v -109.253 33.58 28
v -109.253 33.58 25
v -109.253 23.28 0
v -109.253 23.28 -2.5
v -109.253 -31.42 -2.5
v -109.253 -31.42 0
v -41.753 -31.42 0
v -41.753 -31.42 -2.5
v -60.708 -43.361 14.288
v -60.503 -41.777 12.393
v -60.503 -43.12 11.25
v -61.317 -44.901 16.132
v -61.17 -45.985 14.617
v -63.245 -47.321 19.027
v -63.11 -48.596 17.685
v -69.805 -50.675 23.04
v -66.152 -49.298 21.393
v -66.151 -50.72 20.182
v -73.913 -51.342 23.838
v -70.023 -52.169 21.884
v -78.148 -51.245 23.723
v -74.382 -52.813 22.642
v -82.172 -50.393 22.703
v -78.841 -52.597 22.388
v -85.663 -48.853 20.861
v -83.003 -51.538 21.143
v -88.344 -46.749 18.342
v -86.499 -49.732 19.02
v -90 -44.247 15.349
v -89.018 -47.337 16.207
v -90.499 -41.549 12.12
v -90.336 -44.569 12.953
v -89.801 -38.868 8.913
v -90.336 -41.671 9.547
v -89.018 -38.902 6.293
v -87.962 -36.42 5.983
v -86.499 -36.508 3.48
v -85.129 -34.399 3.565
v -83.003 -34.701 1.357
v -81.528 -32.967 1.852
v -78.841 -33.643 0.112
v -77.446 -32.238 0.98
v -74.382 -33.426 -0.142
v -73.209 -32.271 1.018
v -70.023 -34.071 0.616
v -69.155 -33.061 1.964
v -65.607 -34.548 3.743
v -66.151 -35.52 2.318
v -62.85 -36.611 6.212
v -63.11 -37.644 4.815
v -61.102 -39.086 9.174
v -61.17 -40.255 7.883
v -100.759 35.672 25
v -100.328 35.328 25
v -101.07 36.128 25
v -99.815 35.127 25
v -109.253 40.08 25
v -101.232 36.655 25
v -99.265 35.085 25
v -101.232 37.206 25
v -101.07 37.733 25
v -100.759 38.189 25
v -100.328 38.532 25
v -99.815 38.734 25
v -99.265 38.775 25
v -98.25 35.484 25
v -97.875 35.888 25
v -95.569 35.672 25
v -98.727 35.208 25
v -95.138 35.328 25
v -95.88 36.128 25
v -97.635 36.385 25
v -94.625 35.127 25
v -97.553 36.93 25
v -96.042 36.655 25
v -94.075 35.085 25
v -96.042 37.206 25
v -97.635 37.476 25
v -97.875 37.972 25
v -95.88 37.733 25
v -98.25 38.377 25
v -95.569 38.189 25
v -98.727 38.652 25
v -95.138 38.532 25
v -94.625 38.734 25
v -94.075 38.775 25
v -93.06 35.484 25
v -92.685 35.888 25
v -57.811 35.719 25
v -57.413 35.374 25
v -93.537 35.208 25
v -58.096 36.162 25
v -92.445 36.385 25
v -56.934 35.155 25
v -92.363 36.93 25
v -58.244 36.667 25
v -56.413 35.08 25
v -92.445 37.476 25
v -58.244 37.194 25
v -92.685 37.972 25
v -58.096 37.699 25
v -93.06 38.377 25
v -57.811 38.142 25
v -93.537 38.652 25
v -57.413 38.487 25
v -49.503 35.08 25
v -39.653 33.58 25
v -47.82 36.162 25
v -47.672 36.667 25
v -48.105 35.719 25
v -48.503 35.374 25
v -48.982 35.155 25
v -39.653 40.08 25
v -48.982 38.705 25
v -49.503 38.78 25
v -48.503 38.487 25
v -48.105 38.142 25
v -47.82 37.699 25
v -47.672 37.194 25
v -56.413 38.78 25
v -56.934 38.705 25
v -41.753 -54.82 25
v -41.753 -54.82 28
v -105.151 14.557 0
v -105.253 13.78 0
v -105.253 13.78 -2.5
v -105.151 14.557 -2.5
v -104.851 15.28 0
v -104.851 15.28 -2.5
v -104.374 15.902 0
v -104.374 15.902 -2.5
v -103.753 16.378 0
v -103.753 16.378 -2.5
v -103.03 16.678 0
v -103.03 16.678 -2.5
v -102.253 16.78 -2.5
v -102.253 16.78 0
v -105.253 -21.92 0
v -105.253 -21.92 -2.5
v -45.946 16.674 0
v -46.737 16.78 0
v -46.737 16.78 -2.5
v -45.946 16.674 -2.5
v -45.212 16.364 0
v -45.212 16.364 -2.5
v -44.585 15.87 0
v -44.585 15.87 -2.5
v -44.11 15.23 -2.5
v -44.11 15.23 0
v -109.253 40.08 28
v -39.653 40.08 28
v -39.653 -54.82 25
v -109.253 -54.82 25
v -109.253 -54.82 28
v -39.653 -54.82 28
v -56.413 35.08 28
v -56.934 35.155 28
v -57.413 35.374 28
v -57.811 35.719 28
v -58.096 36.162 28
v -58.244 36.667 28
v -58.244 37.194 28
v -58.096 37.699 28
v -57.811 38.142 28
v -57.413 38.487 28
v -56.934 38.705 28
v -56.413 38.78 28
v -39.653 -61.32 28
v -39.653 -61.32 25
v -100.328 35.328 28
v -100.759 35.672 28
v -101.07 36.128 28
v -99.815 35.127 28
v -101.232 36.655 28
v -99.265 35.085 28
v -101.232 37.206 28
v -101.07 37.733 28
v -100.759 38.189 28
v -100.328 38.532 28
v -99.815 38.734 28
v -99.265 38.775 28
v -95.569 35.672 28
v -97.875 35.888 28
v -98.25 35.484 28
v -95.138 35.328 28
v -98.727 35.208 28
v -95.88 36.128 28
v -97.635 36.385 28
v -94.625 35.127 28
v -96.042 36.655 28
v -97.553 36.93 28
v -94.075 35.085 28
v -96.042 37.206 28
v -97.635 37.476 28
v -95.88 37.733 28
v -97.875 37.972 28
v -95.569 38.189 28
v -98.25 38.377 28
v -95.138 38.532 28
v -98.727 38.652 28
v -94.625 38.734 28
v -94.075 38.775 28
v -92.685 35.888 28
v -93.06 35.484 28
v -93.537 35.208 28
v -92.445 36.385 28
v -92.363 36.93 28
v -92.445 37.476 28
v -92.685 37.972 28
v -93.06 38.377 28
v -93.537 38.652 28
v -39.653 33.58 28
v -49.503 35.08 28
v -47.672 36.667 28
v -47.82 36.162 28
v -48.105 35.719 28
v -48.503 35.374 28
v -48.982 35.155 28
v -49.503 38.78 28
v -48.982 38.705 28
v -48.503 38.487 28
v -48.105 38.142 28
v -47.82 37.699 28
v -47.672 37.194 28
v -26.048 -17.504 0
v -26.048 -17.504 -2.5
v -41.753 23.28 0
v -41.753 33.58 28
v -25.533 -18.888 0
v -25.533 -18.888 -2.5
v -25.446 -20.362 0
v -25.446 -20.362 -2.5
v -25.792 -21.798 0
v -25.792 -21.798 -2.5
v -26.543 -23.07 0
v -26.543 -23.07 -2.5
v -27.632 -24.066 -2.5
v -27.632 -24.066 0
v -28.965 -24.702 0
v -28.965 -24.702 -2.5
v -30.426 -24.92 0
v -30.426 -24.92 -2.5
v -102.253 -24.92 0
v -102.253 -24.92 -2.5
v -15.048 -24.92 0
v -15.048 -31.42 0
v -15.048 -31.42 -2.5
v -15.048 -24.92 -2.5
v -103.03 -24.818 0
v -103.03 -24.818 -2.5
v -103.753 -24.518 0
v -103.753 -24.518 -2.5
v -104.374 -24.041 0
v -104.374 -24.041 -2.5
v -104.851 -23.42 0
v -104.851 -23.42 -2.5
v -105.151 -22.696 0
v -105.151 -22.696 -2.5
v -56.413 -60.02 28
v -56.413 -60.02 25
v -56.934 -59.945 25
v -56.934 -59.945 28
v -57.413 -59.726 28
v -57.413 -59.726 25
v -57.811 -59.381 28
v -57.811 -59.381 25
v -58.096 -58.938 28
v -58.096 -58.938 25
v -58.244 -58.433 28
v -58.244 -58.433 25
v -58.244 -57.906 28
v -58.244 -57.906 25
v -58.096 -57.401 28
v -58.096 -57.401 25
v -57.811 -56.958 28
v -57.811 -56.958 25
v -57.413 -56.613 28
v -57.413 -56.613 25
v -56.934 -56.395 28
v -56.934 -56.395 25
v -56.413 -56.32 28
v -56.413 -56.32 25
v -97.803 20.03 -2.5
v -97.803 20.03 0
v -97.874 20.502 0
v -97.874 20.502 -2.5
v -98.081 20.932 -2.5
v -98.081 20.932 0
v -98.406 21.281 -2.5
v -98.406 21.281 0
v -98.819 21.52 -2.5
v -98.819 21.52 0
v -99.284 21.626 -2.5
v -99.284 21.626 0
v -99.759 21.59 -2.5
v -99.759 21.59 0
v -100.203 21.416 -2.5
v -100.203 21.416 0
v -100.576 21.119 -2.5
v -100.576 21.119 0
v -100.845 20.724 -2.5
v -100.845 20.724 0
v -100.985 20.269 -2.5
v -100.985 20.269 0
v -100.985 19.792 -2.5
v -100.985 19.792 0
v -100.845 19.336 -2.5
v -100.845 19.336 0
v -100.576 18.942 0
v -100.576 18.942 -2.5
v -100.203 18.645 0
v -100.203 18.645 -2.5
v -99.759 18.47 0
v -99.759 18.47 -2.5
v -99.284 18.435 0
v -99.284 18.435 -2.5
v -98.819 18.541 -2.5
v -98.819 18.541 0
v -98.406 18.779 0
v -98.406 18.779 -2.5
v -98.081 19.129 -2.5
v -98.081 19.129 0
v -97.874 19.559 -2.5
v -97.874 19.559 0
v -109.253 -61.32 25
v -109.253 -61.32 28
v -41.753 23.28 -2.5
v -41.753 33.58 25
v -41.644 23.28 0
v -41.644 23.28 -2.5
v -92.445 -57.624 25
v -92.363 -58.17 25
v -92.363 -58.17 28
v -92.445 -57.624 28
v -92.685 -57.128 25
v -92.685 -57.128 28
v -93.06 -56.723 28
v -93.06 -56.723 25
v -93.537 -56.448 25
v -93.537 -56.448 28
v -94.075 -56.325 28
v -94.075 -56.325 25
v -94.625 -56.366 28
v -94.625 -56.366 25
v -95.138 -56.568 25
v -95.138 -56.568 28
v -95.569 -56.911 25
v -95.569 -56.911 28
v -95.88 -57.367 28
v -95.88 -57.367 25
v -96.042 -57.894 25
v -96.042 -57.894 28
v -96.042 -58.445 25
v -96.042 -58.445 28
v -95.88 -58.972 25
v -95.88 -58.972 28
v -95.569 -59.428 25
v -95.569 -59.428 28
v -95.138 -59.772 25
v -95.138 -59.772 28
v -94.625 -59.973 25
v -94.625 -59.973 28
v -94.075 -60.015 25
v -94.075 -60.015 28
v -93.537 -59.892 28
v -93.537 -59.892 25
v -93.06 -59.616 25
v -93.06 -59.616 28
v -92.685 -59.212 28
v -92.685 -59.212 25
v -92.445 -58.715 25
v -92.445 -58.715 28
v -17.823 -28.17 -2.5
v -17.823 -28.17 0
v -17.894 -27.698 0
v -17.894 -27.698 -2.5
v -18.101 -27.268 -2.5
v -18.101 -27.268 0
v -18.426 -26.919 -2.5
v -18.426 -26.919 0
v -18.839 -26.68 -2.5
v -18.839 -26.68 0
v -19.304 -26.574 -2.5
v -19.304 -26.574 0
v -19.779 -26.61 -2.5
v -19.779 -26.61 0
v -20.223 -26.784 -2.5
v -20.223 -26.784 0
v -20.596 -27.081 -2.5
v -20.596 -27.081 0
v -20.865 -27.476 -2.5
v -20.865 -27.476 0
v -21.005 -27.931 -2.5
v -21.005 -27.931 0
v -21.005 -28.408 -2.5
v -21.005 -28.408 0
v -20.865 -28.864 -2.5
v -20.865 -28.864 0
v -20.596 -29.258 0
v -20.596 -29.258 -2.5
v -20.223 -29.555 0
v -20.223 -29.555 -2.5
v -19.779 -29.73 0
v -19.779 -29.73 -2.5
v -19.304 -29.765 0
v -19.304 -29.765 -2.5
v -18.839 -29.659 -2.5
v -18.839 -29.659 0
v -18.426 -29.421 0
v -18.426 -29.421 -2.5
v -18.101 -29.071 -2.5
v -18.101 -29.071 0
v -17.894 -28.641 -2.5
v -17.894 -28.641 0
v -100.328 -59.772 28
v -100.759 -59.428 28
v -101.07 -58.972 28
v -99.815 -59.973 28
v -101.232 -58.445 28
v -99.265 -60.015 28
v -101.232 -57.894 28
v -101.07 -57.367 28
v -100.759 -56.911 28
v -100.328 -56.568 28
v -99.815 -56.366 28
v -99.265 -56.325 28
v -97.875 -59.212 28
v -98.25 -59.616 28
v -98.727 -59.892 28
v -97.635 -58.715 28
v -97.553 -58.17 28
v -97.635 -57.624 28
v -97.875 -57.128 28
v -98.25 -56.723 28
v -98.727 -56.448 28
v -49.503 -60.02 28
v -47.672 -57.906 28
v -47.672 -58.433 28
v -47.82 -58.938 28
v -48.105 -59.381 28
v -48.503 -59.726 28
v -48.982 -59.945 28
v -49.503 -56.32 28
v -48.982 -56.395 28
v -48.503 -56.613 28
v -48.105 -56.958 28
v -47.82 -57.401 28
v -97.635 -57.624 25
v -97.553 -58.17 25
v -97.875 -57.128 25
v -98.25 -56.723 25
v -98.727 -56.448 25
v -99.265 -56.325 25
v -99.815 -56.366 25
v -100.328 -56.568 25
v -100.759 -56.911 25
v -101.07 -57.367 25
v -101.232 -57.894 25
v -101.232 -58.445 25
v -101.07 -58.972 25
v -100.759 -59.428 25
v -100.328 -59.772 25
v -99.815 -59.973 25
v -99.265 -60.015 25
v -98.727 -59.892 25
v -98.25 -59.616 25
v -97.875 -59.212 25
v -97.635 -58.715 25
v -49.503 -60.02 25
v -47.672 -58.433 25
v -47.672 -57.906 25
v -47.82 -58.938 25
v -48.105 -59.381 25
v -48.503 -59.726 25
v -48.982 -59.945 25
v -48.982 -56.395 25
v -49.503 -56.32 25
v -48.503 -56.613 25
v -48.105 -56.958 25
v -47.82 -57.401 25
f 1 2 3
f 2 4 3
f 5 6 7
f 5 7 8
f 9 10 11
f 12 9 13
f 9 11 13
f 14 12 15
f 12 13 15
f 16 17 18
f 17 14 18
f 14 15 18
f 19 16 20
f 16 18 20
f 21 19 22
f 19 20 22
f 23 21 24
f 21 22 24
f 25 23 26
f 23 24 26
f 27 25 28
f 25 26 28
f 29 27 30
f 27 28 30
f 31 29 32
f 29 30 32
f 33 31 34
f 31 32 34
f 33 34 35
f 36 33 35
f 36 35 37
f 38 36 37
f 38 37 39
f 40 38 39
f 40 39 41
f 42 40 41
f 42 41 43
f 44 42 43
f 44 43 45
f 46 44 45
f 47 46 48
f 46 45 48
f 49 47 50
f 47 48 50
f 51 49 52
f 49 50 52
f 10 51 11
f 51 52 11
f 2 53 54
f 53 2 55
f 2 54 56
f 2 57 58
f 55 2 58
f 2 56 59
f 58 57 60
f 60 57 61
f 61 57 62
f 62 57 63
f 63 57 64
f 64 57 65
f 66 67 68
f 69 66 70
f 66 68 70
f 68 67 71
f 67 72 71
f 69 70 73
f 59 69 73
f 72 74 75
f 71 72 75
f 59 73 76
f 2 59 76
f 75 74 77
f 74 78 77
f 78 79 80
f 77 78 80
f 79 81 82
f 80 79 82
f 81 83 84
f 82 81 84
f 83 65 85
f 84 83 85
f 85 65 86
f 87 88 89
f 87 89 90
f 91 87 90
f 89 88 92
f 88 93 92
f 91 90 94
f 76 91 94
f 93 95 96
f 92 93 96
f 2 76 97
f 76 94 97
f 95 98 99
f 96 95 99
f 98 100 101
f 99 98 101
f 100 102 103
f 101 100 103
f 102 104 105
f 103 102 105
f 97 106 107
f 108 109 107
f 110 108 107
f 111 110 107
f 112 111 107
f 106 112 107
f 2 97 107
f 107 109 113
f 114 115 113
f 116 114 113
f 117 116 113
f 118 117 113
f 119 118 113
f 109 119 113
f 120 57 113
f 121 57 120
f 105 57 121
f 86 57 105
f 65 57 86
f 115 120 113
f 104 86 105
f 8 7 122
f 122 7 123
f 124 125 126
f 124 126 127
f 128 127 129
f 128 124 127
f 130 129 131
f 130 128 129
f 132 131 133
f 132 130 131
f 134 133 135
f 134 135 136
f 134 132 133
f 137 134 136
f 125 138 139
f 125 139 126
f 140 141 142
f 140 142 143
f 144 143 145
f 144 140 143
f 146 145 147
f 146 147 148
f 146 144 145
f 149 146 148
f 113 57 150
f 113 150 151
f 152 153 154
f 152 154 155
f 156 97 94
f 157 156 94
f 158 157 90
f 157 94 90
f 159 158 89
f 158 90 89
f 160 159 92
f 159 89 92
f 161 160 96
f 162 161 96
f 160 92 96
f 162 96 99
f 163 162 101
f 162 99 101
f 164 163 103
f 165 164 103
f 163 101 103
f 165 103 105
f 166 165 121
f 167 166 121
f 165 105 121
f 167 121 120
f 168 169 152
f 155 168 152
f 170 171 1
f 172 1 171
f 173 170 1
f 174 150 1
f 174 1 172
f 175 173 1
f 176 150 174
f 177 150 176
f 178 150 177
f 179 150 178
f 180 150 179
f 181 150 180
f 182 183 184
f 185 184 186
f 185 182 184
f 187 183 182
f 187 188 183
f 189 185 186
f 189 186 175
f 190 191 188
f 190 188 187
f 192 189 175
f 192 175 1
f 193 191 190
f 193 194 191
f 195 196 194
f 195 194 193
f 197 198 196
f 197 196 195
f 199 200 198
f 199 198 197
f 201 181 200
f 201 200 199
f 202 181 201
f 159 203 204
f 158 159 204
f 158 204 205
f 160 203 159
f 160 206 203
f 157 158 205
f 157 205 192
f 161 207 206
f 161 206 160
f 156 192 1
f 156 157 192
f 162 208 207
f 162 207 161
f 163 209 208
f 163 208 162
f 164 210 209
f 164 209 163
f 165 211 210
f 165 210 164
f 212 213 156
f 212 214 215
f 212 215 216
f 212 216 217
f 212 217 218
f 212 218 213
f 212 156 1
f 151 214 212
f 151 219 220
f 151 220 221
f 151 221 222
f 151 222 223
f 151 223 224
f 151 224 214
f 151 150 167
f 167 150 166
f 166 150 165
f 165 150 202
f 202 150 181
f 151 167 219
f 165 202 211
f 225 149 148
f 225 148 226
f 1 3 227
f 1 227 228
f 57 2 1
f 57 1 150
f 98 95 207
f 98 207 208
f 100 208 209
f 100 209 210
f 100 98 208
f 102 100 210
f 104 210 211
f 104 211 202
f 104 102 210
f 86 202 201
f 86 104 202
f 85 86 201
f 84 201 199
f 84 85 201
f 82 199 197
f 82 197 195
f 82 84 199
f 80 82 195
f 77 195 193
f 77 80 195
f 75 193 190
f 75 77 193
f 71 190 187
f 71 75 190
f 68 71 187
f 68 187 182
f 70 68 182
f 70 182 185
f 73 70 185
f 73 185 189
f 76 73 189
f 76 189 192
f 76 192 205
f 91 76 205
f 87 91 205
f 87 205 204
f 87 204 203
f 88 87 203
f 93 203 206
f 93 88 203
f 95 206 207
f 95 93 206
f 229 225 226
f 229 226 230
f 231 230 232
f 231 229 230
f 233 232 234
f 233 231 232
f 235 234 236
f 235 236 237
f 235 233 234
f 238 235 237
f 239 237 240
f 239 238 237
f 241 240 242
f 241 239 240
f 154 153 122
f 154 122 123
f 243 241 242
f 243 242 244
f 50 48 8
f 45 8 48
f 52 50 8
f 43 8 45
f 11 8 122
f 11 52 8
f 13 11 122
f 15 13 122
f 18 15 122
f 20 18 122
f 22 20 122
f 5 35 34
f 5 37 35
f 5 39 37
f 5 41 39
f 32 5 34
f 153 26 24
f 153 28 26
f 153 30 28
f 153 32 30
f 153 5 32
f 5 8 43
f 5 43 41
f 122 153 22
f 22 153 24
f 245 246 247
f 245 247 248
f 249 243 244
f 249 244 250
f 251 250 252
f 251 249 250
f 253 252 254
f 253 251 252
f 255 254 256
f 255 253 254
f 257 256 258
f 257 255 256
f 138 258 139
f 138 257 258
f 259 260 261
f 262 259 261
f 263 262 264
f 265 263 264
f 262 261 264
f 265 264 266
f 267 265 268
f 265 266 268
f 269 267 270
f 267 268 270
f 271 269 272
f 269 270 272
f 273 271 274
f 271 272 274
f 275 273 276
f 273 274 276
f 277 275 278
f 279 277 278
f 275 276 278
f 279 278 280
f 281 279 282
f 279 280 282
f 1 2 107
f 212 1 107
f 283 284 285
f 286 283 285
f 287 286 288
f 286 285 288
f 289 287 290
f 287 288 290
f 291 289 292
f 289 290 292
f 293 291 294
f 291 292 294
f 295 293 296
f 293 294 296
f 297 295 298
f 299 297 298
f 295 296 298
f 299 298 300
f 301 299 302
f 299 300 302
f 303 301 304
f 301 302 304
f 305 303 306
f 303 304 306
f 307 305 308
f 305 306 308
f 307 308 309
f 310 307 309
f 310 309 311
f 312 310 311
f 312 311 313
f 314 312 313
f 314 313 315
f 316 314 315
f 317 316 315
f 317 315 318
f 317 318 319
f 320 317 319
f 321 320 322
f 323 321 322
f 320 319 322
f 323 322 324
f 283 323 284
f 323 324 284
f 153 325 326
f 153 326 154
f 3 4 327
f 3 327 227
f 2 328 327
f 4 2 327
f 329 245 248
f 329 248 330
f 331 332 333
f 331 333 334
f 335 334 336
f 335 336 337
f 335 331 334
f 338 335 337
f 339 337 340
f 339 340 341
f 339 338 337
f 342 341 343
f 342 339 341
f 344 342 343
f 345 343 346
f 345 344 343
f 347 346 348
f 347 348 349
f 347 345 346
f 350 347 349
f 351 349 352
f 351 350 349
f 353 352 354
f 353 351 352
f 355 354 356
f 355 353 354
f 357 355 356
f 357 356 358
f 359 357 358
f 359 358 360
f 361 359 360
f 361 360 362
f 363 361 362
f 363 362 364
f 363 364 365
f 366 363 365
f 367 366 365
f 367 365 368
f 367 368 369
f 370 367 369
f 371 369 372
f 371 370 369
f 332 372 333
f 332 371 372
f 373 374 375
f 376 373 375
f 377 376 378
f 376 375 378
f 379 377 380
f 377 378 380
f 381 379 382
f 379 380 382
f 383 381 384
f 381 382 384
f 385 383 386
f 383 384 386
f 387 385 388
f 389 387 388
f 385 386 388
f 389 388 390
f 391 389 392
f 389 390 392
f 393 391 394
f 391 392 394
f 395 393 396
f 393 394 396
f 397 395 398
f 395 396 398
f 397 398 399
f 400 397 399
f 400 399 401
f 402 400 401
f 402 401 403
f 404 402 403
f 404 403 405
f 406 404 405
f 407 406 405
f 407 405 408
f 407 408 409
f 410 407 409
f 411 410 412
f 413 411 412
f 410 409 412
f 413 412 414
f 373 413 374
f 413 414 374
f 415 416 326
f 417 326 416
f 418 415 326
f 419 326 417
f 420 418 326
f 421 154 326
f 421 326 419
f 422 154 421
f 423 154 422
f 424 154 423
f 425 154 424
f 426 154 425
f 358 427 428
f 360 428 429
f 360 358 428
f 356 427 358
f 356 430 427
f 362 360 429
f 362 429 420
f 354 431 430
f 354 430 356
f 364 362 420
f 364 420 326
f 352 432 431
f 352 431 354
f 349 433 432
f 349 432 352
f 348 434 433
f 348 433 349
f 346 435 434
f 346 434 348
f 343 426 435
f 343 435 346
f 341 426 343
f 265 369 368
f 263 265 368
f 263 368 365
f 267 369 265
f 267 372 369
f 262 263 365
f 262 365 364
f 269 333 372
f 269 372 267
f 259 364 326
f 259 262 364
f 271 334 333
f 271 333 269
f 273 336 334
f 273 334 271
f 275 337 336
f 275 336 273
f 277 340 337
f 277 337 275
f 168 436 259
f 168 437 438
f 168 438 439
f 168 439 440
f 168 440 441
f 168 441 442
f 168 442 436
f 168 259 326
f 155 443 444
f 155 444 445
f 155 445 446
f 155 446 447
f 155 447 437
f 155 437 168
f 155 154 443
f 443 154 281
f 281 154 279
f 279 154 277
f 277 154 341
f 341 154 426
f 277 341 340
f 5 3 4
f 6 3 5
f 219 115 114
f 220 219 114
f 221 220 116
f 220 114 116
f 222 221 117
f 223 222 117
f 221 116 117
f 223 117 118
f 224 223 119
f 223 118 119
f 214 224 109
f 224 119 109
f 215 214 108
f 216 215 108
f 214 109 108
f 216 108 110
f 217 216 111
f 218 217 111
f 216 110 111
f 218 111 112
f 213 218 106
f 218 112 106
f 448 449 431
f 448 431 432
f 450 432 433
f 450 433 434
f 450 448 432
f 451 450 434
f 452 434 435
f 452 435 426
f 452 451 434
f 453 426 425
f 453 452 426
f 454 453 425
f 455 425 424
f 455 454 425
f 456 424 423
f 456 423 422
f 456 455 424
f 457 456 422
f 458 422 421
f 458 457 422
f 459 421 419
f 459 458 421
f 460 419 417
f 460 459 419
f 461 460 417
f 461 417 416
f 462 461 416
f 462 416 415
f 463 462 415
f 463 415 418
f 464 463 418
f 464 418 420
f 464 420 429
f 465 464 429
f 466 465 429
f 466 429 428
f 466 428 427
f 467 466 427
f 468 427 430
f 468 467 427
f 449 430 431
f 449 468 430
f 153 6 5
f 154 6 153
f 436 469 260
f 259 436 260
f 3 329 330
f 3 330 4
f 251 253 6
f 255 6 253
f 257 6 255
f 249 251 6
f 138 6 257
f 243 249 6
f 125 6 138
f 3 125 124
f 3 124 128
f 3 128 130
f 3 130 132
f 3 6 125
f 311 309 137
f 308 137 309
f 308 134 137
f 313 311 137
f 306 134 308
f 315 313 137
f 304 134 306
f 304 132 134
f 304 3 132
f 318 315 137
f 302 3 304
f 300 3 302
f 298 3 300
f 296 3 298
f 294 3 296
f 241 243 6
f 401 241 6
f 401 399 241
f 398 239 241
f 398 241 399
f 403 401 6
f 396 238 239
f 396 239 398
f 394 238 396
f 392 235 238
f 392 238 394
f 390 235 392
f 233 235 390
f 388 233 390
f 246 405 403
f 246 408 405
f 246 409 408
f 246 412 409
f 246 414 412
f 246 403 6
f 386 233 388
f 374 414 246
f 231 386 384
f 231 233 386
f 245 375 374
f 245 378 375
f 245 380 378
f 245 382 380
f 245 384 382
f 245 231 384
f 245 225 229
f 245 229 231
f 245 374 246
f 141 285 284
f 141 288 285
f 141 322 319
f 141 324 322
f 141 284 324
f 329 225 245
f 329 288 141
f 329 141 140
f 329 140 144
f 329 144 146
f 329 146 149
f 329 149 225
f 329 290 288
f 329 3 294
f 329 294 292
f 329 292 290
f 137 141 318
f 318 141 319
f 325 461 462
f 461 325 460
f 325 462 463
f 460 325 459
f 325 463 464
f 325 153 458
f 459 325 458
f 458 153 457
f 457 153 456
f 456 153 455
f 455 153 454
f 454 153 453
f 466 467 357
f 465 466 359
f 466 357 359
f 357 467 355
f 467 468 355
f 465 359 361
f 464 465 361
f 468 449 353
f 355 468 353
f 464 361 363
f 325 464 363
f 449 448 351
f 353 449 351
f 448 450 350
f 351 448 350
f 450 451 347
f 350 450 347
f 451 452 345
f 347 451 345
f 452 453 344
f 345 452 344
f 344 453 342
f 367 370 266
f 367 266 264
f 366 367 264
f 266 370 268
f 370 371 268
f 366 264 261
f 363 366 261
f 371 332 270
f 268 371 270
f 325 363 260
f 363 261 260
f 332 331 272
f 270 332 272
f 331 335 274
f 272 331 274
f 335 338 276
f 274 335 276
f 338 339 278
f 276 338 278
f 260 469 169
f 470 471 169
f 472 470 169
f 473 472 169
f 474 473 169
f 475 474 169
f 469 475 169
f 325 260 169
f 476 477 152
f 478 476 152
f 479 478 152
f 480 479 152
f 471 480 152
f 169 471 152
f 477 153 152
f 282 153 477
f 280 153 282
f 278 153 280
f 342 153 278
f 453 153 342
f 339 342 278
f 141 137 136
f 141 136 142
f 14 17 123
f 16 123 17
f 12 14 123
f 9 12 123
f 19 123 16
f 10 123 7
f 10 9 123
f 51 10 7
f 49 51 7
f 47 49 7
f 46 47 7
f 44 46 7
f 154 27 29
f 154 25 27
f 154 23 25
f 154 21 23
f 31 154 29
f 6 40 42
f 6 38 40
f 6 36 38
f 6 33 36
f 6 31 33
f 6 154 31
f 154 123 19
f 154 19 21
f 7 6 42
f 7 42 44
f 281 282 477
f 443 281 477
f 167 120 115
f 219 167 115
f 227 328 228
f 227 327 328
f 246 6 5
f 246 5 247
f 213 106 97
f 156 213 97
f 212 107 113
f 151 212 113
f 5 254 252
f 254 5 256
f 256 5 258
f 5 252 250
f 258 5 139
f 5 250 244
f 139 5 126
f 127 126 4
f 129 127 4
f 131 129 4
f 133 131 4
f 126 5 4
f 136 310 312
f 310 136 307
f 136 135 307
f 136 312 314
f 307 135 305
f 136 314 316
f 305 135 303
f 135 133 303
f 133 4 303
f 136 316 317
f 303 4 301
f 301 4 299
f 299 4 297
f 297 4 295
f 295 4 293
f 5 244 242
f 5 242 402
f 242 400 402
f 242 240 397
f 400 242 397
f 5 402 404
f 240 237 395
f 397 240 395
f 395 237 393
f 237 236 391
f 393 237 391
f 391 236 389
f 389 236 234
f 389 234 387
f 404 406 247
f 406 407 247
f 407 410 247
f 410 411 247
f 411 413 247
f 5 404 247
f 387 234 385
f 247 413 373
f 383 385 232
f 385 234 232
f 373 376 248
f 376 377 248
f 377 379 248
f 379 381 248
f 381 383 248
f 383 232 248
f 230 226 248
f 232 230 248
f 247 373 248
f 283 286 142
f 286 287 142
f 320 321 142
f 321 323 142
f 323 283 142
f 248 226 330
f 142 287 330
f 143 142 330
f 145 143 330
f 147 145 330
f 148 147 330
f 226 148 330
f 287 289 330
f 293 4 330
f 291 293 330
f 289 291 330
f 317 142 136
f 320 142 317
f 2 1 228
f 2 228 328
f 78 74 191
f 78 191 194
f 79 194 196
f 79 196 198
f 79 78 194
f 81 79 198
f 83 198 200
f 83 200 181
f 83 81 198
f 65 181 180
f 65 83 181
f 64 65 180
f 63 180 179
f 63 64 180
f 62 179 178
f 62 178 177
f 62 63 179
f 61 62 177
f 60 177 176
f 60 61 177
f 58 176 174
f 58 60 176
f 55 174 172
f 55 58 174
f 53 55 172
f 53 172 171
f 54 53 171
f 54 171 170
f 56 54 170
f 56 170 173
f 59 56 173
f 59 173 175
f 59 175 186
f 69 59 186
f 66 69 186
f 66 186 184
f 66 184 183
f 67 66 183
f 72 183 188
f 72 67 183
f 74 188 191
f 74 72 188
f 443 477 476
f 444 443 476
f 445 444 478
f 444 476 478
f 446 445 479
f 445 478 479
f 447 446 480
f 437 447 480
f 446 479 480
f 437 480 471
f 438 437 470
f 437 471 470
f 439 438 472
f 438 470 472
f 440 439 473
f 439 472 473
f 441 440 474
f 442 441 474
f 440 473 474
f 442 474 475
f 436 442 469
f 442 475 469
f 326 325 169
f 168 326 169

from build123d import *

# Parameters (mm, degrees)
F2_W      = 69.6
F2_H      = 6.5
F2_R      = 1.85
F3_DEPTH  = 3
F4_R      = 1.6
F6_DEPTH  = 2.5
F8_DEPTH  = 67.5
F9_R      = 15
F10_DEPTH = 25


with BuildPart() as f3:
    # F2 (on offset) → F3 (new body)
    with BuildSketch(Plane.XY.offset(25)):
        with Locations((-74.4531251728, 36.8302476406)):
            Rectangle(F2_W, F2_H)
        with Locations((-99.4031251728, 36.9302476406)):
            Circle(F2_R, mode=Mode.SUBTRACT)
        with Locations((-94.2131251728, 36.9302476406)):
            Circle(F2_R, mode=Mode.SUBTRACT)
        with BuildLine():
            ThreePointArc((-56.4131251728, 35.0802476406), (-58.2631251728, 36.9302476406), (-56.4131251728, 38.7802476406))
            Line((-56.4131251728, 38.7802476406), (-49.5031251728, 38.7802476406))
            ThreePointArc((-49.5031251728, 38.7802476406), (-47.6531251728, 36.9302476406), (-49.5031251728, 35.0802476406))
            Line((-49.5031251728, 35.0802476406), (-56.4131251728, 35.0802476406))
        make_face(mode=Mode.SUBTRACT)
    extrude(amount=F3_DEPTH)


with BuildPart() as f3b:
    # F2 (on offset) → F3, piece 2 (new body)
    with BuildSketch(Plane.XY.offset(25)):
        with Locations((-74.4531251728, -58.0697523594)):
            Rectangle(F2_W, F2_H)
        with Locations((-99.4031251728, -58.1697523594)):
            Circle(F2_R, mode=Mode.SUBTRACT)
        with Locations((-94.2131251728, -58.1697523594)):
            Circle(F2_R, mode=Mode.SUBTRACT)
        with BuildLine():
            ThreePointArc((-56.4131251728, -60.0197523594), (-58.2631251728, -58.1697523594), (-56.4131251728, -56.3197523594))
            Line((-56.4131251728, -56.3197523594), (-49.5031251728, -56.3197523594))
            ThreePointArc((-49.5031251728, -56.3197523594), (-47.6531251728, -58.1697523594), (-49.5031251728, -60.0197523594))
            Line((-49.5031251728, -60.0197523594), (-56.4131251728, -60.0197523594))
        make_face(mode=Mode.SUBTRACT)
    extrude(amount=F3_DEPTH)


with BuildPart() as f6:
    # F4 (on Top) → F6 (new body)
    with BuildSketch(Plane.XY):
        Polygon((-41.6441885754, 23.2802476406), (-109.2531251728, 23.2802476406), (-109.2531251728, 16.7802476406), (-109.2531251728, -24.9197523594), (-109.2531251728, -31.4197523594), (-15.048397198, -31.4197523594), (-15.048397198, -24.9197523594), align=None)
        with Locations((-19.4231251728, -28.1697523594)):
            Circle(F4_R, mode=Mode.SUBTRACT)
        with BuildLine():
            ThreePointArc((-105.2531251728, 13.7802476406), (-104.3744455164, 15.9015679842), (-102.2531251728, 16.7802476406))
            Line((-102.2531251728, 16.7802476406), (-46.7366417344, 16.7802476406))
            ThreePointArc((-46.7366417344, 16.7802476406), (-45.2115241933, 16.3636594324), (-44.1099706414, 15.2295919644))
            Line((-44.1099706414, 15.2295919644), (-26.0481339213, -17.5041784864))
            ThreePointArc((-26.0481339213, -17.5041784864), (-26.1202327568, -22.4616149279), (-30.4259190764, -24.9197523594))
            Line((-30.4259190764, -24.9197523594), (-102.2531251728, -24.9197523594))
            ThreePointArc((-102.2531251728, -24.9197523594), (-104.3744455164, -24.0410727029), (-105.2531251728, -21.9197523594))
            Line((-105.2531251728, -21.9197523594), (-105.2531251728, 13.7802476406))
        make_face(mode=Mode.SUBTRACT)
        with Locations((-99.4031251728, 20.0302476406)):
            Circle(F4_R, mode=Mode.SUBTRACT)
    extrude(amount=-F6_DEPTH)


with BuildPart() as f8:
    # F7 (on face) → F8 (new body)
    with BuildSketch(Plane(origin=(-109.2531251728, 0, 0), x_dir=(0, -1, 0), z_dir=(-1, 0, 0))):
        Polygon((-23.2802476406, 0), (-33.5802476406, 28), (-33.5802476406, 25), (-23.2802476406, -2.5), align=None)
    extrude(amount=-F8_DEPTH)


with BuildPart() as f8b:
    # F7 (on face) → F8, piece 2 (new body)
    with BuildSketch(Plane(origin=(-109.2531251728, 0, 0), x_dir=(0, -1, 0), z_dir=(-1, 0, 0))):
        Polygon((54.8197523594, 28), (31.4197523594, 0), (31.4197523594, -2.5), (54.8197523594, 25), align=None)
    extrude(amount=-F8_DEPTH)

    # F9 (on face) → F10 (cut)
    with BuildSketch(Plane(origin=(0, -19.4583088961, -16.5572519334), x_dir=(1, 0, 0), z_dir=(0, -0.761597553, -0.6480502814))):
        with Locations((-75.5031251728, 36.5117401236)):
            Circle(F9_R)
    extrude(amount=-F10_DEPTH, mode=Mode.SUBTRACT)


solid = Compound([f3.part, f3b.part, f6.part, f8.part, f8b.part])
